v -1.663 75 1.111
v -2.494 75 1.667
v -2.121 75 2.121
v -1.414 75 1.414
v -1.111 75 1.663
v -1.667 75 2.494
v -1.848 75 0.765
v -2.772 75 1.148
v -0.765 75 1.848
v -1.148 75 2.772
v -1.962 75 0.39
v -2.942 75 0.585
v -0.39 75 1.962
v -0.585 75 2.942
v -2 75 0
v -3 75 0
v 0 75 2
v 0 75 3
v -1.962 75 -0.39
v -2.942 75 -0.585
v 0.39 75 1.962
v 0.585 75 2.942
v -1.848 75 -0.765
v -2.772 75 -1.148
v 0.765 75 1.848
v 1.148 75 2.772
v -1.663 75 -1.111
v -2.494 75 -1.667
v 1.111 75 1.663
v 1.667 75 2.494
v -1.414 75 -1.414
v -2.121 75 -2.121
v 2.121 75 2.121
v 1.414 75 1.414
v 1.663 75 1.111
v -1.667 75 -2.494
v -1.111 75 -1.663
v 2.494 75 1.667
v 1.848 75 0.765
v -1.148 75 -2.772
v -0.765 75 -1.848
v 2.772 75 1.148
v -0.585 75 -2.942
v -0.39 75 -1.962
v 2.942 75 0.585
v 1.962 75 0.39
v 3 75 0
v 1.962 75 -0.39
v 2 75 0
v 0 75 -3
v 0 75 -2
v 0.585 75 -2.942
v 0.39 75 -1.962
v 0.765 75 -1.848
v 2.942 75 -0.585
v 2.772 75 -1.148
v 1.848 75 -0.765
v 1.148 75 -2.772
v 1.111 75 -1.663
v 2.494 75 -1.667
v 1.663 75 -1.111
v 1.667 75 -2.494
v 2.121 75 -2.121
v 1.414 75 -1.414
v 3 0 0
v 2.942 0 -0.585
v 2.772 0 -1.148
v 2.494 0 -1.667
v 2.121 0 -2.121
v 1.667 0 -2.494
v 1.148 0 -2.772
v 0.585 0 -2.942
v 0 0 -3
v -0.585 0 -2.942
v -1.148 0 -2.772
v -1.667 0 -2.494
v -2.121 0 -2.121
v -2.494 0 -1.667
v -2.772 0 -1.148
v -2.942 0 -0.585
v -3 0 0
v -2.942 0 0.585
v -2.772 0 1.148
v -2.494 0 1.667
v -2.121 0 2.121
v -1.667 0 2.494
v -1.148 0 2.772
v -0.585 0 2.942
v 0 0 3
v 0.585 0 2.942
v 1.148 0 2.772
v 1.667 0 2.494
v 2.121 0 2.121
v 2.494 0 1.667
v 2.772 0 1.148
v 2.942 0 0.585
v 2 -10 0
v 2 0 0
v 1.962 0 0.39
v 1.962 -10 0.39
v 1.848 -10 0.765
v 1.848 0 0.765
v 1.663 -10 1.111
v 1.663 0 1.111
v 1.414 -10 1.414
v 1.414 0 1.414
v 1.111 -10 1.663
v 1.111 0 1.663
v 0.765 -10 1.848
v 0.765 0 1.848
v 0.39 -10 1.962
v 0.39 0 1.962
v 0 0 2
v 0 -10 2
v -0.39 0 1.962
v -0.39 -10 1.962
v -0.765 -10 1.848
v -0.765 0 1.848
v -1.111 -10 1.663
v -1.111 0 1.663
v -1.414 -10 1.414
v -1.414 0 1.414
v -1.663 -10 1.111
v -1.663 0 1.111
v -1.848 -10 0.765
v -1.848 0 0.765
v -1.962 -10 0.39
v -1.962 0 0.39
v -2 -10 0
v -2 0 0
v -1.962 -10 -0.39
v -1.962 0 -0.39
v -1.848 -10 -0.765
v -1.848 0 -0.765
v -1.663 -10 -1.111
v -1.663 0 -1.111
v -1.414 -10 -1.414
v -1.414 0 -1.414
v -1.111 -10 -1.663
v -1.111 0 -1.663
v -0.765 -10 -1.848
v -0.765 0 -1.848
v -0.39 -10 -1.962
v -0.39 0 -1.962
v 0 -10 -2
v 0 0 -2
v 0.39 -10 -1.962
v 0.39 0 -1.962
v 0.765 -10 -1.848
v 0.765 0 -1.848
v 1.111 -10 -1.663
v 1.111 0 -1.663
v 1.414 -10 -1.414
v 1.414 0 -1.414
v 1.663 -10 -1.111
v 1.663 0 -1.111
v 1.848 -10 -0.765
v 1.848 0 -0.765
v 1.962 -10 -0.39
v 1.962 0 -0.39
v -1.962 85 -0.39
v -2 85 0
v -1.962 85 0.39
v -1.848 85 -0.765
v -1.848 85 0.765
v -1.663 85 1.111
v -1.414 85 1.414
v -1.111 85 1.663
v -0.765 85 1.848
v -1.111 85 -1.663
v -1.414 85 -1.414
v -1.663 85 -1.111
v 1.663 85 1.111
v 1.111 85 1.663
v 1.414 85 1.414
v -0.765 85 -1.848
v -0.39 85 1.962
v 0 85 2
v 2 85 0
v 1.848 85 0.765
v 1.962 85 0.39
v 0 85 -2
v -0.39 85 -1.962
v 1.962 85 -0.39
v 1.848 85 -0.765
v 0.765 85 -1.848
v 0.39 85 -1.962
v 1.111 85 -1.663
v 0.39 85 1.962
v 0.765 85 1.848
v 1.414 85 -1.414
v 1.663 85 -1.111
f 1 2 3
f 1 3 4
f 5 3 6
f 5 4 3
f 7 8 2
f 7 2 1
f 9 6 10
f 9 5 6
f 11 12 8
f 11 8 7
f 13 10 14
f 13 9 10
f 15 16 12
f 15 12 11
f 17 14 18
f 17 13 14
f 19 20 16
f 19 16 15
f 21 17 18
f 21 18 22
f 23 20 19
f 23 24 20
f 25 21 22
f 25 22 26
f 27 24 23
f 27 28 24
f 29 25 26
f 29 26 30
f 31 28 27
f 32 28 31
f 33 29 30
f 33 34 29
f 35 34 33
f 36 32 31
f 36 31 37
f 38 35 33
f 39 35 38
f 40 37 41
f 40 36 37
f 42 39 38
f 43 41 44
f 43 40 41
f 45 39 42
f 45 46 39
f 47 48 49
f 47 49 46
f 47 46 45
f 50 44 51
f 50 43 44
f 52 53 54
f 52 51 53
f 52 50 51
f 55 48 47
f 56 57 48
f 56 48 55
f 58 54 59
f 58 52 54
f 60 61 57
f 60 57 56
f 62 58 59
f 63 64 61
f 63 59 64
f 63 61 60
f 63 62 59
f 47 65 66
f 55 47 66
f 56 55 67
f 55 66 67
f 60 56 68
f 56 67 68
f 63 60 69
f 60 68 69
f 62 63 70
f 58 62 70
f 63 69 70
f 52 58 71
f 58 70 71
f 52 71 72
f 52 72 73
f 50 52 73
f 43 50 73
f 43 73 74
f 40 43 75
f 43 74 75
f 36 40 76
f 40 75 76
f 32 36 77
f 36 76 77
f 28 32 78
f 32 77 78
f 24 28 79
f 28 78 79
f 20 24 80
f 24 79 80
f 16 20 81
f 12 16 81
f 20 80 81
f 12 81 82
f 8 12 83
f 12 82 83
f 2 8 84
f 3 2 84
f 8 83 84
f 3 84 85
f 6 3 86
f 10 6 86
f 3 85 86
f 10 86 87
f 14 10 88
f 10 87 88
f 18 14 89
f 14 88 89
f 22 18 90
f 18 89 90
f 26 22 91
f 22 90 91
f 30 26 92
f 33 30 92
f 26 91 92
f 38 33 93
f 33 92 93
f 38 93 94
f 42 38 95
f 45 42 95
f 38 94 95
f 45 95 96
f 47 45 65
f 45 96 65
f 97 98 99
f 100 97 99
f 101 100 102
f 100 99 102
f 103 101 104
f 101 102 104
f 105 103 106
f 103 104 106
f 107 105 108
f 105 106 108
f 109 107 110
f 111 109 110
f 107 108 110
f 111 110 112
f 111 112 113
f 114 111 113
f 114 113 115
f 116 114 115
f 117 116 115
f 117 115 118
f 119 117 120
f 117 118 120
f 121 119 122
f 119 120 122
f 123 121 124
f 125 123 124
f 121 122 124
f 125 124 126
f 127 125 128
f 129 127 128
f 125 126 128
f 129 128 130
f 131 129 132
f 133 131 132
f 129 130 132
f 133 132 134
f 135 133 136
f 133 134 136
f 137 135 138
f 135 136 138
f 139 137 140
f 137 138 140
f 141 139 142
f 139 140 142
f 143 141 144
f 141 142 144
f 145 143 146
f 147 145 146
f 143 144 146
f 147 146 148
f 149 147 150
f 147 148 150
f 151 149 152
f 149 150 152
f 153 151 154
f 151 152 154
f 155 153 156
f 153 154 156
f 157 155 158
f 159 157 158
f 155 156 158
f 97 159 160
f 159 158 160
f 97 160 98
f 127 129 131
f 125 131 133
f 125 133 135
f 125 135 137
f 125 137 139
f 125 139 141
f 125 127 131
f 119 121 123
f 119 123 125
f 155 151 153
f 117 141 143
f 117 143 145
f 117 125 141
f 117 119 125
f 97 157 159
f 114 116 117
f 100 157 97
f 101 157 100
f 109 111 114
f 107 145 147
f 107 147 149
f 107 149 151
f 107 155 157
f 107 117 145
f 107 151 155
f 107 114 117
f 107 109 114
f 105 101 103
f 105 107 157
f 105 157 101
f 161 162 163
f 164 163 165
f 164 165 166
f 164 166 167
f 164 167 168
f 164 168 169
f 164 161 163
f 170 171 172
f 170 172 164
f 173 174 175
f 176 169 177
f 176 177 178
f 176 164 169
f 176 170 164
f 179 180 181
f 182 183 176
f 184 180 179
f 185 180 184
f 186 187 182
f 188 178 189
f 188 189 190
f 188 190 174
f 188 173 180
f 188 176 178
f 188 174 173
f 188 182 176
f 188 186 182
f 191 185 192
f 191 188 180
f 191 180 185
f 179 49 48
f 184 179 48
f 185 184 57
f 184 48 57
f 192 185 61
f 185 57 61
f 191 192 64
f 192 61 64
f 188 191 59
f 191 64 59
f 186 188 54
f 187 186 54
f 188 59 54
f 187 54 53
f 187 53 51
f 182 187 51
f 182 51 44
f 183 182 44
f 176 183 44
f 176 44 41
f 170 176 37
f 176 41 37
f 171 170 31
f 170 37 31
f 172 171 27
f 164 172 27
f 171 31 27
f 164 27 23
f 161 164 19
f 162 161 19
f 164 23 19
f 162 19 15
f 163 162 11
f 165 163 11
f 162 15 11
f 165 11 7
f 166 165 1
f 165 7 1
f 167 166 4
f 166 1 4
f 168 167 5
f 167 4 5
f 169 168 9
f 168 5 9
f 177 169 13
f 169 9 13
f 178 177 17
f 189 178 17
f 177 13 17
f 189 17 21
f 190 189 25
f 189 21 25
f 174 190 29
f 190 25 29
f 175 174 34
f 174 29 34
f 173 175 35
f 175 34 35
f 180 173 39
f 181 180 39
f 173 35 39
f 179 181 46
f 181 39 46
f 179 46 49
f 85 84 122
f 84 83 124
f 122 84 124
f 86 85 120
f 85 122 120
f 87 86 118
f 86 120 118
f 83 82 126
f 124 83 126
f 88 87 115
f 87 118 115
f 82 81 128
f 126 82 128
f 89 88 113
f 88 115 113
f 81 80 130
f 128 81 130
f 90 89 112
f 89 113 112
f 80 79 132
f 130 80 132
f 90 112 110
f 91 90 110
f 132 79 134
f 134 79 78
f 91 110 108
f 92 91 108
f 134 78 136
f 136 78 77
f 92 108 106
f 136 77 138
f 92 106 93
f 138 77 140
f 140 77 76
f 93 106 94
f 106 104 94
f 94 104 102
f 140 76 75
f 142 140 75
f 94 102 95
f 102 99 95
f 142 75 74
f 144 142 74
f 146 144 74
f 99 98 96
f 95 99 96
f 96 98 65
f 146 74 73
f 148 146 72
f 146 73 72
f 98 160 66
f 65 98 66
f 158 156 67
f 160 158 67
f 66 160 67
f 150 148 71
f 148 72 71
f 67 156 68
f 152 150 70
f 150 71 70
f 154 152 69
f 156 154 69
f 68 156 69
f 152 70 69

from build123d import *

# Parameters (mm, degrees)
SKETCH1_R           = 3
BOSS_EXTRUDE1_DEPTH = 75
SKETCH2_R           = 2
BOSS_EXTRUDE2_DEPTH = 10
SKETCH3_R           = 2
BOSS_EXTRUDE3_DEPTH = 10


with BuildPart() as part:
    # Sketch1 → Boss-Extrude1 (new body)
    with BuildSketch(Plane(origin=(0, 0, 0), x_dir=(1, 0, 0), z_dir=(0, 1, 0))):
        Circle(SKETCH1_R)
    extrude(amount=BOSS_EXTRUDE1_DEPTH)

    # Sketch2 → Boss-Extrude2 (add)
    with BuildSketch(Plane(origin=(0, 75, 0), x_dir=(1, 0, 0), z_dir=(0, 1, 0))):
        Circle(SKETCH2_R)
    extrude(amount=BOSS_EXTRUDE2_DEPTH)

    # Sketch3 → Boss-Extrude3 (add)
    with BuildSketch(Plane.XZ):
        Circle(SKETCH3_R)
    extrude(amount=BOSS_EXTRUDE3_DEPTH)


solid = part.part
